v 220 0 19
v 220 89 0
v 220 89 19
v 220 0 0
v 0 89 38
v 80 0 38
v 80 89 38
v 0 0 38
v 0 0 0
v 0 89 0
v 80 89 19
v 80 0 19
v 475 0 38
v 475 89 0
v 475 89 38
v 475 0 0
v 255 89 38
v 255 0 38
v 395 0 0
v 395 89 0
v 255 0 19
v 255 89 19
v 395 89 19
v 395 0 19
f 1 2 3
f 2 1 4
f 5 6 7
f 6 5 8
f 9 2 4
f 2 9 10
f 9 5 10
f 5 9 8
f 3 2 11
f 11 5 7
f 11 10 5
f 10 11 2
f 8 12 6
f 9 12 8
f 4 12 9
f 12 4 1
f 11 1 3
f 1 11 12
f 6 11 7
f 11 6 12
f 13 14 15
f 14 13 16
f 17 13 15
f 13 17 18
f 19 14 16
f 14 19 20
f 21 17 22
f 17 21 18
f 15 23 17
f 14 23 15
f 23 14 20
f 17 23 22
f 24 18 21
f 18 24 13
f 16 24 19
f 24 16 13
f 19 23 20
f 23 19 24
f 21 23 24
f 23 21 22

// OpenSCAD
// file: hashira_lib.scad
// HASHIRA — shared dimensions (mm)
// Tunable via -D on the command line / OpenSCAD MCP variables

post_w = 89;          // ~3.5" nominal 4x4
post_d = 89;
post_h = 1800;        // above-grade height shown
rail_w = 89;          // rail width (through post face)
rail_t = 38;          // rail thickness
rail_len = 1800;      // bay center-to-center approx
bay_cc = 1800;        // post center spacing
cap_overhang = 18;
cap_h = 28;

// rail elevations from post bottom (above grade in model)
rail_z_low = 200;
rail_z_mid = 900;
rail_z_top = 1500;

ease = 1.2;           // seasonal mortise ease
peg_d = 10;
wood_post = [0.55, 0.35, 0.18];
wood_rail = [0.42, 0.52, 0.34];
wood_peg  = [0.72, 0.62, 0.42];

module hashira_post(h=post_h, w=post_w, d=post_d) {
  color(wood_post) cube([w, d, h], center=false);
}

module hashira_cap(w=post_w, d=post_d, oh=cap_overhang, h=cap_h) {
  color([0.88, 0.85, 0.78])
  translate([-oh, -oh, 0])
    linear_extrude(height=h, scale=0.72)
      square([w + 2*oh, d + 2*oh], center=false);
}

module nuki_rail(len=rail_len, w=rail_w, t=rail_t) {
  color(wood_rail) cube([len, w, t], center=false);
}

module peg(h=post_d + 20, d=peg_d) {
  color(wood_peg) cylinder(h=h, d=d, $fn=24);
}
// main file
// Kama-tsugi 鎌継ぎ — sickle scarf for lengthening rails
include <hashira_lib.scad>

exploded = 1;
scarf = 140;
hook_w = 22;
hook_d = 28;
explode_gap = 35;

module left_scarf() {
  difference() {
    cube([220, rail_w, rail_t]);
    translate([220 - scarf, -1, rail_t/2])
      cube([scarf + 1, rail_w + 2, rail_t/2 + 1]);
    // hook pocket
    translate([220 - scarf/2 - hook_d/2, (rail_w - hook_w)/2 - 0.4, -0.1])
      cube([hook_d, hook_w + 0.8, rail_t/2 + 0.2]);
  }
  // remaining half + hook
  translate([220 - scarf, 0, 0])
    cube([scarf, rail_w, rail_t/2]);
  translate([220 - scarf/2 - hook_d/2 + 2, (rail_w - hook_w)/2 + 1, 0])
    cube([hook_d - 4, hook_w - 2, rail_t/2]);
}

module right_scarf() {
  difference() {
    cube([220, rail_w, rail_t]);
    translate([-1, -1, -0.1])
      cube([scarf + 1, rail_w + 2, rail_t/2 + 0.1]);
  }
  translate([0, 0, rail_t/2])
    cube([scarf, rail_w, rail_t/2]);
  // sickle hook
  translate([scarf/2 - hook_d/2 + 2, (rail_w - hook_w)/2 + 1, rail_t/2])
    cube([hook_d - 4, hook_w - 2, rail_t/2]);
}

module kama_assembly() {
  color(wood_rail) left_scarf();
  color(wood_post)
    translate([220 - scarf + (exploded ? scarf + explode_gap : 0), 0, 0])
      right_scarf();
}

kama_assembly();
